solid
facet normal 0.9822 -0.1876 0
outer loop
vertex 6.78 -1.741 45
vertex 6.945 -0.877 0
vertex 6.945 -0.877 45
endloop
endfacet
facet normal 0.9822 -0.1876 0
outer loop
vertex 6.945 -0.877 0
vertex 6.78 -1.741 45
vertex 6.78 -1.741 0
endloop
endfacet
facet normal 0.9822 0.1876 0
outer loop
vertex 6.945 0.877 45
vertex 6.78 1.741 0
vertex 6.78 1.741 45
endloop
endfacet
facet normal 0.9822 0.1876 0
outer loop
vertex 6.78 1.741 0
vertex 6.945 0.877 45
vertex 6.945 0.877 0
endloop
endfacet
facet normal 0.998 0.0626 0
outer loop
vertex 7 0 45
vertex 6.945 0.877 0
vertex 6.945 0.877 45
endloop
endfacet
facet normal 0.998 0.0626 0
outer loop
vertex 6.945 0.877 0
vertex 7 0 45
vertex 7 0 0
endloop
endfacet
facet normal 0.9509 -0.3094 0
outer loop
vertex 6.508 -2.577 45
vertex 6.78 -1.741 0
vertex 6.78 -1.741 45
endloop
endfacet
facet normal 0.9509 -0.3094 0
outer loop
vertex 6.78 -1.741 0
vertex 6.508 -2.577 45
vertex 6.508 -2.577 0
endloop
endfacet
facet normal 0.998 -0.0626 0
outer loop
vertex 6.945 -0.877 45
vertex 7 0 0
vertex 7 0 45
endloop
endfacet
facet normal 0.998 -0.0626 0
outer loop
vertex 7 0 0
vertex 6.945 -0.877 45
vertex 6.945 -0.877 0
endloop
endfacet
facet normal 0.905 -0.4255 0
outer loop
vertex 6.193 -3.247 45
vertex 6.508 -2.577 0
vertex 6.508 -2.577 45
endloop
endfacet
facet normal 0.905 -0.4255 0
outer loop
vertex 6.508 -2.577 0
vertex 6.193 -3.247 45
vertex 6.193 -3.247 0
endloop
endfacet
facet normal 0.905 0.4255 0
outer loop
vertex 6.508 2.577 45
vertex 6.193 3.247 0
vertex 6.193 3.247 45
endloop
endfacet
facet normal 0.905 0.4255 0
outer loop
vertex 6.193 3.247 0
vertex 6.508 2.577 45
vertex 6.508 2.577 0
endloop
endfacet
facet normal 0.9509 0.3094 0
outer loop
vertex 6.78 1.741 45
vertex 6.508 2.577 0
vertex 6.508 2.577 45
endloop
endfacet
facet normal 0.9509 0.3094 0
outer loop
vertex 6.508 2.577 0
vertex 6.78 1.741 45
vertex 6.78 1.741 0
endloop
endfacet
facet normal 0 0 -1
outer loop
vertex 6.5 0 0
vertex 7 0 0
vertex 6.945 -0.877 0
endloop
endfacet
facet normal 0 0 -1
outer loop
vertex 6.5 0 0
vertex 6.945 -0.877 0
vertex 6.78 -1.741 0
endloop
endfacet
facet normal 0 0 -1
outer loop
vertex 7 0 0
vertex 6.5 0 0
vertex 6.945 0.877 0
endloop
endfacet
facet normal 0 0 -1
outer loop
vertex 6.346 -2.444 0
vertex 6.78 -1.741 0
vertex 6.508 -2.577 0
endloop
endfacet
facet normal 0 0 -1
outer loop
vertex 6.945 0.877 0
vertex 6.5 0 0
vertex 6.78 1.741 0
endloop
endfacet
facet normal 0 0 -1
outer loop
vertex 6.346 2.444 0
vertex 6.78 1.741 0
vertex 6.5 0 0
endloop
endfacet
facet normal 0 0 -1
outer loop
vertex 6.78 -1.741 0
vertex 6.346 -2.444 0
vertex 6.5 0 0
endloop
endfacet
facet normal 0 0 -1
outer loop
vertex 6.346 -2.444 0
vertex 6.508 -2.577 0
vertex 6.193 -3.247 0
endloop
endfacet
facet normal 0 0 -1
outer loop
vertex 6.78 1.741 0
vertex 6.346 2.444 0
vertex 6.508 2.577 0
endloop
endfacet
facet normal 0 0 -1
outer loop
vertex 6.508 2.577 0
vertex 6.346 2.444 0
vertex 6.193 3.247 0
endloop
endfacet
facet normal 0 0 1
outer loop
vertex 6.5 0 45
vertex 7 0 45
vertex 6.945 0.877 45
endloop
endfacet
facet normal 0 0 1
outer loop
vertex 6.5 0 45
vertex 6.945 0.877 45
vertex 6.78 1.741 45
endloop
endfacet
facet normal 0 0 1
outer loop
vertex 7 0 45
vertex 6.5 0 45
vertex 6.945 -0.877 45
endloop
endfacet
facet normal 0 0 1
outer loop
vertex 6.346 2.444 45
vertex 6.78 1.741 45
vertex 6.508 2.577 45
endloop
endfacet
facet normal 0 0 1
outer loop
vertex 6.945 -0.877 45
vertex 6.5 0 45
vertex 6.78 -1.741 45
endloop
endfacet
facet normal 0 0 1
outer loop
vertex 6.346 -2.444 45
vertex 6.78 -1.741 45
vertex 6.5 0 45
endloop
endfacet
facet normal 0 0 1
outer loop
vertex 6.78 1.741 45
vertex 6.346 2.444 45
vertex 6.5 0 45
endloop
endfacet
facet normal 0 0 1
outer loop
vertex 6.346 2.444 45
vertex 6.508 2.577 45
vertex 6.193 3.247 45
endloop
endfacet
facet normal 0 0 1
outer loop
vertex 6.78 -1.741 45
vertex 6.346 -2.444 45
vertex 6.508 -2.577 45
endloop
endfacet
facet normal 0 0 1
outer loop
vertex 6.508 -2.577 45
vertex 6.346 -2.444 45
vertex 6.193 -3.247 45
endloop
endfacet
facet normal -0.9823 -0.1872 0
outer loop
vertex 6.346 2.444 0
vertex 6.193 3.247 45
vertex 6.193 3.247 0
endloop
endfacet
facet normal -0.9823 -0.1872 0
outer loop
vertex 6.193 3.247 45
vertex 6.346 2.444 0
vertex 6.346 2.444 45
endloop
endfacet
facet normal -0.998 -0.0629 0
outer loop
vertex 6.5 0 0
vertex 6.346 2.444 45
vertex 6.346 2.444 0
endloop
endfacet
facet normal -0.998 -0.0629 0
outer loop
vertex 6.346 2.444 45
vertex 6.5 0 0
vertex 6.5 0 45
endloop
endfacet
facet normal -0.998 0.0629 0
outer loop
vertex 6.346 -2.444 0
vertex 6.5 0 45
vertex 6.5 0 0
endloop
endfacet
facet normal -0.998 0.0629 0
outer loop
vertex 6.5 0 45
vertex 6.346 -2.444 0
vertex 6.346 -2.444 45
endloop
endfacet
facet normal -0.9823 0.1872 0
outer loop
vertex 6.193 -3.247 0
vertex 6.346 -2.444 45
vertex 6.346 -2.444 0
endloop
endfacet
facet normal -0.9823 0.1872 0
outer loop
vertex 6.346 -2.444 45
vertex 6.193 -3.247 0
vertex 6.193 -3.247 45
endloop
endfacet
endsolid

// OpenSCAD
$fn = 50;


difference() {
	union() {
		cylinder(h = 45, r = 7.0000000000);
		translate(v = [-16.0000000000, 0, 0]) {
			cylinder(h = 45, r = 7.0000000000);
		}
	}
	union() {
		cylinder(h = 45, r = 3.2500000000);
		cylinder(h = 45, r = 1.8000000000);
		cylinder(h = 45, r = 1.8000000000);
		cylinder(h = 45, r = 1.8000000000);
		translate(v = [-20.5000000000, 0, 0]) {
			hull() {
				translate(v = [-3.7500000000, 0.0000000000, 0]) {
					cylinder(h = 45, r = 10.5000000000);
				}
				translate(v = [3.7500000000, 0.0000000000, 0]) {
					cylinder(h = 45, r = 10.5000000000);
				}
				translate(v = [-3.7500000000, -0.0000000000, 0]) {
					cylinder(h = 45, r = 10.5000000000);
				}
				translate(v = [3.7500000000, -0.0000000000, 0]) {
					cylinder(h = 45, r = 10.5000000000);
				}
			}
		}
		translate(v = [-13.0000000000, 0, 0.0000000000]) {
			cylinder(h = 45, r = 19.5000000000);
		}
	}
}
